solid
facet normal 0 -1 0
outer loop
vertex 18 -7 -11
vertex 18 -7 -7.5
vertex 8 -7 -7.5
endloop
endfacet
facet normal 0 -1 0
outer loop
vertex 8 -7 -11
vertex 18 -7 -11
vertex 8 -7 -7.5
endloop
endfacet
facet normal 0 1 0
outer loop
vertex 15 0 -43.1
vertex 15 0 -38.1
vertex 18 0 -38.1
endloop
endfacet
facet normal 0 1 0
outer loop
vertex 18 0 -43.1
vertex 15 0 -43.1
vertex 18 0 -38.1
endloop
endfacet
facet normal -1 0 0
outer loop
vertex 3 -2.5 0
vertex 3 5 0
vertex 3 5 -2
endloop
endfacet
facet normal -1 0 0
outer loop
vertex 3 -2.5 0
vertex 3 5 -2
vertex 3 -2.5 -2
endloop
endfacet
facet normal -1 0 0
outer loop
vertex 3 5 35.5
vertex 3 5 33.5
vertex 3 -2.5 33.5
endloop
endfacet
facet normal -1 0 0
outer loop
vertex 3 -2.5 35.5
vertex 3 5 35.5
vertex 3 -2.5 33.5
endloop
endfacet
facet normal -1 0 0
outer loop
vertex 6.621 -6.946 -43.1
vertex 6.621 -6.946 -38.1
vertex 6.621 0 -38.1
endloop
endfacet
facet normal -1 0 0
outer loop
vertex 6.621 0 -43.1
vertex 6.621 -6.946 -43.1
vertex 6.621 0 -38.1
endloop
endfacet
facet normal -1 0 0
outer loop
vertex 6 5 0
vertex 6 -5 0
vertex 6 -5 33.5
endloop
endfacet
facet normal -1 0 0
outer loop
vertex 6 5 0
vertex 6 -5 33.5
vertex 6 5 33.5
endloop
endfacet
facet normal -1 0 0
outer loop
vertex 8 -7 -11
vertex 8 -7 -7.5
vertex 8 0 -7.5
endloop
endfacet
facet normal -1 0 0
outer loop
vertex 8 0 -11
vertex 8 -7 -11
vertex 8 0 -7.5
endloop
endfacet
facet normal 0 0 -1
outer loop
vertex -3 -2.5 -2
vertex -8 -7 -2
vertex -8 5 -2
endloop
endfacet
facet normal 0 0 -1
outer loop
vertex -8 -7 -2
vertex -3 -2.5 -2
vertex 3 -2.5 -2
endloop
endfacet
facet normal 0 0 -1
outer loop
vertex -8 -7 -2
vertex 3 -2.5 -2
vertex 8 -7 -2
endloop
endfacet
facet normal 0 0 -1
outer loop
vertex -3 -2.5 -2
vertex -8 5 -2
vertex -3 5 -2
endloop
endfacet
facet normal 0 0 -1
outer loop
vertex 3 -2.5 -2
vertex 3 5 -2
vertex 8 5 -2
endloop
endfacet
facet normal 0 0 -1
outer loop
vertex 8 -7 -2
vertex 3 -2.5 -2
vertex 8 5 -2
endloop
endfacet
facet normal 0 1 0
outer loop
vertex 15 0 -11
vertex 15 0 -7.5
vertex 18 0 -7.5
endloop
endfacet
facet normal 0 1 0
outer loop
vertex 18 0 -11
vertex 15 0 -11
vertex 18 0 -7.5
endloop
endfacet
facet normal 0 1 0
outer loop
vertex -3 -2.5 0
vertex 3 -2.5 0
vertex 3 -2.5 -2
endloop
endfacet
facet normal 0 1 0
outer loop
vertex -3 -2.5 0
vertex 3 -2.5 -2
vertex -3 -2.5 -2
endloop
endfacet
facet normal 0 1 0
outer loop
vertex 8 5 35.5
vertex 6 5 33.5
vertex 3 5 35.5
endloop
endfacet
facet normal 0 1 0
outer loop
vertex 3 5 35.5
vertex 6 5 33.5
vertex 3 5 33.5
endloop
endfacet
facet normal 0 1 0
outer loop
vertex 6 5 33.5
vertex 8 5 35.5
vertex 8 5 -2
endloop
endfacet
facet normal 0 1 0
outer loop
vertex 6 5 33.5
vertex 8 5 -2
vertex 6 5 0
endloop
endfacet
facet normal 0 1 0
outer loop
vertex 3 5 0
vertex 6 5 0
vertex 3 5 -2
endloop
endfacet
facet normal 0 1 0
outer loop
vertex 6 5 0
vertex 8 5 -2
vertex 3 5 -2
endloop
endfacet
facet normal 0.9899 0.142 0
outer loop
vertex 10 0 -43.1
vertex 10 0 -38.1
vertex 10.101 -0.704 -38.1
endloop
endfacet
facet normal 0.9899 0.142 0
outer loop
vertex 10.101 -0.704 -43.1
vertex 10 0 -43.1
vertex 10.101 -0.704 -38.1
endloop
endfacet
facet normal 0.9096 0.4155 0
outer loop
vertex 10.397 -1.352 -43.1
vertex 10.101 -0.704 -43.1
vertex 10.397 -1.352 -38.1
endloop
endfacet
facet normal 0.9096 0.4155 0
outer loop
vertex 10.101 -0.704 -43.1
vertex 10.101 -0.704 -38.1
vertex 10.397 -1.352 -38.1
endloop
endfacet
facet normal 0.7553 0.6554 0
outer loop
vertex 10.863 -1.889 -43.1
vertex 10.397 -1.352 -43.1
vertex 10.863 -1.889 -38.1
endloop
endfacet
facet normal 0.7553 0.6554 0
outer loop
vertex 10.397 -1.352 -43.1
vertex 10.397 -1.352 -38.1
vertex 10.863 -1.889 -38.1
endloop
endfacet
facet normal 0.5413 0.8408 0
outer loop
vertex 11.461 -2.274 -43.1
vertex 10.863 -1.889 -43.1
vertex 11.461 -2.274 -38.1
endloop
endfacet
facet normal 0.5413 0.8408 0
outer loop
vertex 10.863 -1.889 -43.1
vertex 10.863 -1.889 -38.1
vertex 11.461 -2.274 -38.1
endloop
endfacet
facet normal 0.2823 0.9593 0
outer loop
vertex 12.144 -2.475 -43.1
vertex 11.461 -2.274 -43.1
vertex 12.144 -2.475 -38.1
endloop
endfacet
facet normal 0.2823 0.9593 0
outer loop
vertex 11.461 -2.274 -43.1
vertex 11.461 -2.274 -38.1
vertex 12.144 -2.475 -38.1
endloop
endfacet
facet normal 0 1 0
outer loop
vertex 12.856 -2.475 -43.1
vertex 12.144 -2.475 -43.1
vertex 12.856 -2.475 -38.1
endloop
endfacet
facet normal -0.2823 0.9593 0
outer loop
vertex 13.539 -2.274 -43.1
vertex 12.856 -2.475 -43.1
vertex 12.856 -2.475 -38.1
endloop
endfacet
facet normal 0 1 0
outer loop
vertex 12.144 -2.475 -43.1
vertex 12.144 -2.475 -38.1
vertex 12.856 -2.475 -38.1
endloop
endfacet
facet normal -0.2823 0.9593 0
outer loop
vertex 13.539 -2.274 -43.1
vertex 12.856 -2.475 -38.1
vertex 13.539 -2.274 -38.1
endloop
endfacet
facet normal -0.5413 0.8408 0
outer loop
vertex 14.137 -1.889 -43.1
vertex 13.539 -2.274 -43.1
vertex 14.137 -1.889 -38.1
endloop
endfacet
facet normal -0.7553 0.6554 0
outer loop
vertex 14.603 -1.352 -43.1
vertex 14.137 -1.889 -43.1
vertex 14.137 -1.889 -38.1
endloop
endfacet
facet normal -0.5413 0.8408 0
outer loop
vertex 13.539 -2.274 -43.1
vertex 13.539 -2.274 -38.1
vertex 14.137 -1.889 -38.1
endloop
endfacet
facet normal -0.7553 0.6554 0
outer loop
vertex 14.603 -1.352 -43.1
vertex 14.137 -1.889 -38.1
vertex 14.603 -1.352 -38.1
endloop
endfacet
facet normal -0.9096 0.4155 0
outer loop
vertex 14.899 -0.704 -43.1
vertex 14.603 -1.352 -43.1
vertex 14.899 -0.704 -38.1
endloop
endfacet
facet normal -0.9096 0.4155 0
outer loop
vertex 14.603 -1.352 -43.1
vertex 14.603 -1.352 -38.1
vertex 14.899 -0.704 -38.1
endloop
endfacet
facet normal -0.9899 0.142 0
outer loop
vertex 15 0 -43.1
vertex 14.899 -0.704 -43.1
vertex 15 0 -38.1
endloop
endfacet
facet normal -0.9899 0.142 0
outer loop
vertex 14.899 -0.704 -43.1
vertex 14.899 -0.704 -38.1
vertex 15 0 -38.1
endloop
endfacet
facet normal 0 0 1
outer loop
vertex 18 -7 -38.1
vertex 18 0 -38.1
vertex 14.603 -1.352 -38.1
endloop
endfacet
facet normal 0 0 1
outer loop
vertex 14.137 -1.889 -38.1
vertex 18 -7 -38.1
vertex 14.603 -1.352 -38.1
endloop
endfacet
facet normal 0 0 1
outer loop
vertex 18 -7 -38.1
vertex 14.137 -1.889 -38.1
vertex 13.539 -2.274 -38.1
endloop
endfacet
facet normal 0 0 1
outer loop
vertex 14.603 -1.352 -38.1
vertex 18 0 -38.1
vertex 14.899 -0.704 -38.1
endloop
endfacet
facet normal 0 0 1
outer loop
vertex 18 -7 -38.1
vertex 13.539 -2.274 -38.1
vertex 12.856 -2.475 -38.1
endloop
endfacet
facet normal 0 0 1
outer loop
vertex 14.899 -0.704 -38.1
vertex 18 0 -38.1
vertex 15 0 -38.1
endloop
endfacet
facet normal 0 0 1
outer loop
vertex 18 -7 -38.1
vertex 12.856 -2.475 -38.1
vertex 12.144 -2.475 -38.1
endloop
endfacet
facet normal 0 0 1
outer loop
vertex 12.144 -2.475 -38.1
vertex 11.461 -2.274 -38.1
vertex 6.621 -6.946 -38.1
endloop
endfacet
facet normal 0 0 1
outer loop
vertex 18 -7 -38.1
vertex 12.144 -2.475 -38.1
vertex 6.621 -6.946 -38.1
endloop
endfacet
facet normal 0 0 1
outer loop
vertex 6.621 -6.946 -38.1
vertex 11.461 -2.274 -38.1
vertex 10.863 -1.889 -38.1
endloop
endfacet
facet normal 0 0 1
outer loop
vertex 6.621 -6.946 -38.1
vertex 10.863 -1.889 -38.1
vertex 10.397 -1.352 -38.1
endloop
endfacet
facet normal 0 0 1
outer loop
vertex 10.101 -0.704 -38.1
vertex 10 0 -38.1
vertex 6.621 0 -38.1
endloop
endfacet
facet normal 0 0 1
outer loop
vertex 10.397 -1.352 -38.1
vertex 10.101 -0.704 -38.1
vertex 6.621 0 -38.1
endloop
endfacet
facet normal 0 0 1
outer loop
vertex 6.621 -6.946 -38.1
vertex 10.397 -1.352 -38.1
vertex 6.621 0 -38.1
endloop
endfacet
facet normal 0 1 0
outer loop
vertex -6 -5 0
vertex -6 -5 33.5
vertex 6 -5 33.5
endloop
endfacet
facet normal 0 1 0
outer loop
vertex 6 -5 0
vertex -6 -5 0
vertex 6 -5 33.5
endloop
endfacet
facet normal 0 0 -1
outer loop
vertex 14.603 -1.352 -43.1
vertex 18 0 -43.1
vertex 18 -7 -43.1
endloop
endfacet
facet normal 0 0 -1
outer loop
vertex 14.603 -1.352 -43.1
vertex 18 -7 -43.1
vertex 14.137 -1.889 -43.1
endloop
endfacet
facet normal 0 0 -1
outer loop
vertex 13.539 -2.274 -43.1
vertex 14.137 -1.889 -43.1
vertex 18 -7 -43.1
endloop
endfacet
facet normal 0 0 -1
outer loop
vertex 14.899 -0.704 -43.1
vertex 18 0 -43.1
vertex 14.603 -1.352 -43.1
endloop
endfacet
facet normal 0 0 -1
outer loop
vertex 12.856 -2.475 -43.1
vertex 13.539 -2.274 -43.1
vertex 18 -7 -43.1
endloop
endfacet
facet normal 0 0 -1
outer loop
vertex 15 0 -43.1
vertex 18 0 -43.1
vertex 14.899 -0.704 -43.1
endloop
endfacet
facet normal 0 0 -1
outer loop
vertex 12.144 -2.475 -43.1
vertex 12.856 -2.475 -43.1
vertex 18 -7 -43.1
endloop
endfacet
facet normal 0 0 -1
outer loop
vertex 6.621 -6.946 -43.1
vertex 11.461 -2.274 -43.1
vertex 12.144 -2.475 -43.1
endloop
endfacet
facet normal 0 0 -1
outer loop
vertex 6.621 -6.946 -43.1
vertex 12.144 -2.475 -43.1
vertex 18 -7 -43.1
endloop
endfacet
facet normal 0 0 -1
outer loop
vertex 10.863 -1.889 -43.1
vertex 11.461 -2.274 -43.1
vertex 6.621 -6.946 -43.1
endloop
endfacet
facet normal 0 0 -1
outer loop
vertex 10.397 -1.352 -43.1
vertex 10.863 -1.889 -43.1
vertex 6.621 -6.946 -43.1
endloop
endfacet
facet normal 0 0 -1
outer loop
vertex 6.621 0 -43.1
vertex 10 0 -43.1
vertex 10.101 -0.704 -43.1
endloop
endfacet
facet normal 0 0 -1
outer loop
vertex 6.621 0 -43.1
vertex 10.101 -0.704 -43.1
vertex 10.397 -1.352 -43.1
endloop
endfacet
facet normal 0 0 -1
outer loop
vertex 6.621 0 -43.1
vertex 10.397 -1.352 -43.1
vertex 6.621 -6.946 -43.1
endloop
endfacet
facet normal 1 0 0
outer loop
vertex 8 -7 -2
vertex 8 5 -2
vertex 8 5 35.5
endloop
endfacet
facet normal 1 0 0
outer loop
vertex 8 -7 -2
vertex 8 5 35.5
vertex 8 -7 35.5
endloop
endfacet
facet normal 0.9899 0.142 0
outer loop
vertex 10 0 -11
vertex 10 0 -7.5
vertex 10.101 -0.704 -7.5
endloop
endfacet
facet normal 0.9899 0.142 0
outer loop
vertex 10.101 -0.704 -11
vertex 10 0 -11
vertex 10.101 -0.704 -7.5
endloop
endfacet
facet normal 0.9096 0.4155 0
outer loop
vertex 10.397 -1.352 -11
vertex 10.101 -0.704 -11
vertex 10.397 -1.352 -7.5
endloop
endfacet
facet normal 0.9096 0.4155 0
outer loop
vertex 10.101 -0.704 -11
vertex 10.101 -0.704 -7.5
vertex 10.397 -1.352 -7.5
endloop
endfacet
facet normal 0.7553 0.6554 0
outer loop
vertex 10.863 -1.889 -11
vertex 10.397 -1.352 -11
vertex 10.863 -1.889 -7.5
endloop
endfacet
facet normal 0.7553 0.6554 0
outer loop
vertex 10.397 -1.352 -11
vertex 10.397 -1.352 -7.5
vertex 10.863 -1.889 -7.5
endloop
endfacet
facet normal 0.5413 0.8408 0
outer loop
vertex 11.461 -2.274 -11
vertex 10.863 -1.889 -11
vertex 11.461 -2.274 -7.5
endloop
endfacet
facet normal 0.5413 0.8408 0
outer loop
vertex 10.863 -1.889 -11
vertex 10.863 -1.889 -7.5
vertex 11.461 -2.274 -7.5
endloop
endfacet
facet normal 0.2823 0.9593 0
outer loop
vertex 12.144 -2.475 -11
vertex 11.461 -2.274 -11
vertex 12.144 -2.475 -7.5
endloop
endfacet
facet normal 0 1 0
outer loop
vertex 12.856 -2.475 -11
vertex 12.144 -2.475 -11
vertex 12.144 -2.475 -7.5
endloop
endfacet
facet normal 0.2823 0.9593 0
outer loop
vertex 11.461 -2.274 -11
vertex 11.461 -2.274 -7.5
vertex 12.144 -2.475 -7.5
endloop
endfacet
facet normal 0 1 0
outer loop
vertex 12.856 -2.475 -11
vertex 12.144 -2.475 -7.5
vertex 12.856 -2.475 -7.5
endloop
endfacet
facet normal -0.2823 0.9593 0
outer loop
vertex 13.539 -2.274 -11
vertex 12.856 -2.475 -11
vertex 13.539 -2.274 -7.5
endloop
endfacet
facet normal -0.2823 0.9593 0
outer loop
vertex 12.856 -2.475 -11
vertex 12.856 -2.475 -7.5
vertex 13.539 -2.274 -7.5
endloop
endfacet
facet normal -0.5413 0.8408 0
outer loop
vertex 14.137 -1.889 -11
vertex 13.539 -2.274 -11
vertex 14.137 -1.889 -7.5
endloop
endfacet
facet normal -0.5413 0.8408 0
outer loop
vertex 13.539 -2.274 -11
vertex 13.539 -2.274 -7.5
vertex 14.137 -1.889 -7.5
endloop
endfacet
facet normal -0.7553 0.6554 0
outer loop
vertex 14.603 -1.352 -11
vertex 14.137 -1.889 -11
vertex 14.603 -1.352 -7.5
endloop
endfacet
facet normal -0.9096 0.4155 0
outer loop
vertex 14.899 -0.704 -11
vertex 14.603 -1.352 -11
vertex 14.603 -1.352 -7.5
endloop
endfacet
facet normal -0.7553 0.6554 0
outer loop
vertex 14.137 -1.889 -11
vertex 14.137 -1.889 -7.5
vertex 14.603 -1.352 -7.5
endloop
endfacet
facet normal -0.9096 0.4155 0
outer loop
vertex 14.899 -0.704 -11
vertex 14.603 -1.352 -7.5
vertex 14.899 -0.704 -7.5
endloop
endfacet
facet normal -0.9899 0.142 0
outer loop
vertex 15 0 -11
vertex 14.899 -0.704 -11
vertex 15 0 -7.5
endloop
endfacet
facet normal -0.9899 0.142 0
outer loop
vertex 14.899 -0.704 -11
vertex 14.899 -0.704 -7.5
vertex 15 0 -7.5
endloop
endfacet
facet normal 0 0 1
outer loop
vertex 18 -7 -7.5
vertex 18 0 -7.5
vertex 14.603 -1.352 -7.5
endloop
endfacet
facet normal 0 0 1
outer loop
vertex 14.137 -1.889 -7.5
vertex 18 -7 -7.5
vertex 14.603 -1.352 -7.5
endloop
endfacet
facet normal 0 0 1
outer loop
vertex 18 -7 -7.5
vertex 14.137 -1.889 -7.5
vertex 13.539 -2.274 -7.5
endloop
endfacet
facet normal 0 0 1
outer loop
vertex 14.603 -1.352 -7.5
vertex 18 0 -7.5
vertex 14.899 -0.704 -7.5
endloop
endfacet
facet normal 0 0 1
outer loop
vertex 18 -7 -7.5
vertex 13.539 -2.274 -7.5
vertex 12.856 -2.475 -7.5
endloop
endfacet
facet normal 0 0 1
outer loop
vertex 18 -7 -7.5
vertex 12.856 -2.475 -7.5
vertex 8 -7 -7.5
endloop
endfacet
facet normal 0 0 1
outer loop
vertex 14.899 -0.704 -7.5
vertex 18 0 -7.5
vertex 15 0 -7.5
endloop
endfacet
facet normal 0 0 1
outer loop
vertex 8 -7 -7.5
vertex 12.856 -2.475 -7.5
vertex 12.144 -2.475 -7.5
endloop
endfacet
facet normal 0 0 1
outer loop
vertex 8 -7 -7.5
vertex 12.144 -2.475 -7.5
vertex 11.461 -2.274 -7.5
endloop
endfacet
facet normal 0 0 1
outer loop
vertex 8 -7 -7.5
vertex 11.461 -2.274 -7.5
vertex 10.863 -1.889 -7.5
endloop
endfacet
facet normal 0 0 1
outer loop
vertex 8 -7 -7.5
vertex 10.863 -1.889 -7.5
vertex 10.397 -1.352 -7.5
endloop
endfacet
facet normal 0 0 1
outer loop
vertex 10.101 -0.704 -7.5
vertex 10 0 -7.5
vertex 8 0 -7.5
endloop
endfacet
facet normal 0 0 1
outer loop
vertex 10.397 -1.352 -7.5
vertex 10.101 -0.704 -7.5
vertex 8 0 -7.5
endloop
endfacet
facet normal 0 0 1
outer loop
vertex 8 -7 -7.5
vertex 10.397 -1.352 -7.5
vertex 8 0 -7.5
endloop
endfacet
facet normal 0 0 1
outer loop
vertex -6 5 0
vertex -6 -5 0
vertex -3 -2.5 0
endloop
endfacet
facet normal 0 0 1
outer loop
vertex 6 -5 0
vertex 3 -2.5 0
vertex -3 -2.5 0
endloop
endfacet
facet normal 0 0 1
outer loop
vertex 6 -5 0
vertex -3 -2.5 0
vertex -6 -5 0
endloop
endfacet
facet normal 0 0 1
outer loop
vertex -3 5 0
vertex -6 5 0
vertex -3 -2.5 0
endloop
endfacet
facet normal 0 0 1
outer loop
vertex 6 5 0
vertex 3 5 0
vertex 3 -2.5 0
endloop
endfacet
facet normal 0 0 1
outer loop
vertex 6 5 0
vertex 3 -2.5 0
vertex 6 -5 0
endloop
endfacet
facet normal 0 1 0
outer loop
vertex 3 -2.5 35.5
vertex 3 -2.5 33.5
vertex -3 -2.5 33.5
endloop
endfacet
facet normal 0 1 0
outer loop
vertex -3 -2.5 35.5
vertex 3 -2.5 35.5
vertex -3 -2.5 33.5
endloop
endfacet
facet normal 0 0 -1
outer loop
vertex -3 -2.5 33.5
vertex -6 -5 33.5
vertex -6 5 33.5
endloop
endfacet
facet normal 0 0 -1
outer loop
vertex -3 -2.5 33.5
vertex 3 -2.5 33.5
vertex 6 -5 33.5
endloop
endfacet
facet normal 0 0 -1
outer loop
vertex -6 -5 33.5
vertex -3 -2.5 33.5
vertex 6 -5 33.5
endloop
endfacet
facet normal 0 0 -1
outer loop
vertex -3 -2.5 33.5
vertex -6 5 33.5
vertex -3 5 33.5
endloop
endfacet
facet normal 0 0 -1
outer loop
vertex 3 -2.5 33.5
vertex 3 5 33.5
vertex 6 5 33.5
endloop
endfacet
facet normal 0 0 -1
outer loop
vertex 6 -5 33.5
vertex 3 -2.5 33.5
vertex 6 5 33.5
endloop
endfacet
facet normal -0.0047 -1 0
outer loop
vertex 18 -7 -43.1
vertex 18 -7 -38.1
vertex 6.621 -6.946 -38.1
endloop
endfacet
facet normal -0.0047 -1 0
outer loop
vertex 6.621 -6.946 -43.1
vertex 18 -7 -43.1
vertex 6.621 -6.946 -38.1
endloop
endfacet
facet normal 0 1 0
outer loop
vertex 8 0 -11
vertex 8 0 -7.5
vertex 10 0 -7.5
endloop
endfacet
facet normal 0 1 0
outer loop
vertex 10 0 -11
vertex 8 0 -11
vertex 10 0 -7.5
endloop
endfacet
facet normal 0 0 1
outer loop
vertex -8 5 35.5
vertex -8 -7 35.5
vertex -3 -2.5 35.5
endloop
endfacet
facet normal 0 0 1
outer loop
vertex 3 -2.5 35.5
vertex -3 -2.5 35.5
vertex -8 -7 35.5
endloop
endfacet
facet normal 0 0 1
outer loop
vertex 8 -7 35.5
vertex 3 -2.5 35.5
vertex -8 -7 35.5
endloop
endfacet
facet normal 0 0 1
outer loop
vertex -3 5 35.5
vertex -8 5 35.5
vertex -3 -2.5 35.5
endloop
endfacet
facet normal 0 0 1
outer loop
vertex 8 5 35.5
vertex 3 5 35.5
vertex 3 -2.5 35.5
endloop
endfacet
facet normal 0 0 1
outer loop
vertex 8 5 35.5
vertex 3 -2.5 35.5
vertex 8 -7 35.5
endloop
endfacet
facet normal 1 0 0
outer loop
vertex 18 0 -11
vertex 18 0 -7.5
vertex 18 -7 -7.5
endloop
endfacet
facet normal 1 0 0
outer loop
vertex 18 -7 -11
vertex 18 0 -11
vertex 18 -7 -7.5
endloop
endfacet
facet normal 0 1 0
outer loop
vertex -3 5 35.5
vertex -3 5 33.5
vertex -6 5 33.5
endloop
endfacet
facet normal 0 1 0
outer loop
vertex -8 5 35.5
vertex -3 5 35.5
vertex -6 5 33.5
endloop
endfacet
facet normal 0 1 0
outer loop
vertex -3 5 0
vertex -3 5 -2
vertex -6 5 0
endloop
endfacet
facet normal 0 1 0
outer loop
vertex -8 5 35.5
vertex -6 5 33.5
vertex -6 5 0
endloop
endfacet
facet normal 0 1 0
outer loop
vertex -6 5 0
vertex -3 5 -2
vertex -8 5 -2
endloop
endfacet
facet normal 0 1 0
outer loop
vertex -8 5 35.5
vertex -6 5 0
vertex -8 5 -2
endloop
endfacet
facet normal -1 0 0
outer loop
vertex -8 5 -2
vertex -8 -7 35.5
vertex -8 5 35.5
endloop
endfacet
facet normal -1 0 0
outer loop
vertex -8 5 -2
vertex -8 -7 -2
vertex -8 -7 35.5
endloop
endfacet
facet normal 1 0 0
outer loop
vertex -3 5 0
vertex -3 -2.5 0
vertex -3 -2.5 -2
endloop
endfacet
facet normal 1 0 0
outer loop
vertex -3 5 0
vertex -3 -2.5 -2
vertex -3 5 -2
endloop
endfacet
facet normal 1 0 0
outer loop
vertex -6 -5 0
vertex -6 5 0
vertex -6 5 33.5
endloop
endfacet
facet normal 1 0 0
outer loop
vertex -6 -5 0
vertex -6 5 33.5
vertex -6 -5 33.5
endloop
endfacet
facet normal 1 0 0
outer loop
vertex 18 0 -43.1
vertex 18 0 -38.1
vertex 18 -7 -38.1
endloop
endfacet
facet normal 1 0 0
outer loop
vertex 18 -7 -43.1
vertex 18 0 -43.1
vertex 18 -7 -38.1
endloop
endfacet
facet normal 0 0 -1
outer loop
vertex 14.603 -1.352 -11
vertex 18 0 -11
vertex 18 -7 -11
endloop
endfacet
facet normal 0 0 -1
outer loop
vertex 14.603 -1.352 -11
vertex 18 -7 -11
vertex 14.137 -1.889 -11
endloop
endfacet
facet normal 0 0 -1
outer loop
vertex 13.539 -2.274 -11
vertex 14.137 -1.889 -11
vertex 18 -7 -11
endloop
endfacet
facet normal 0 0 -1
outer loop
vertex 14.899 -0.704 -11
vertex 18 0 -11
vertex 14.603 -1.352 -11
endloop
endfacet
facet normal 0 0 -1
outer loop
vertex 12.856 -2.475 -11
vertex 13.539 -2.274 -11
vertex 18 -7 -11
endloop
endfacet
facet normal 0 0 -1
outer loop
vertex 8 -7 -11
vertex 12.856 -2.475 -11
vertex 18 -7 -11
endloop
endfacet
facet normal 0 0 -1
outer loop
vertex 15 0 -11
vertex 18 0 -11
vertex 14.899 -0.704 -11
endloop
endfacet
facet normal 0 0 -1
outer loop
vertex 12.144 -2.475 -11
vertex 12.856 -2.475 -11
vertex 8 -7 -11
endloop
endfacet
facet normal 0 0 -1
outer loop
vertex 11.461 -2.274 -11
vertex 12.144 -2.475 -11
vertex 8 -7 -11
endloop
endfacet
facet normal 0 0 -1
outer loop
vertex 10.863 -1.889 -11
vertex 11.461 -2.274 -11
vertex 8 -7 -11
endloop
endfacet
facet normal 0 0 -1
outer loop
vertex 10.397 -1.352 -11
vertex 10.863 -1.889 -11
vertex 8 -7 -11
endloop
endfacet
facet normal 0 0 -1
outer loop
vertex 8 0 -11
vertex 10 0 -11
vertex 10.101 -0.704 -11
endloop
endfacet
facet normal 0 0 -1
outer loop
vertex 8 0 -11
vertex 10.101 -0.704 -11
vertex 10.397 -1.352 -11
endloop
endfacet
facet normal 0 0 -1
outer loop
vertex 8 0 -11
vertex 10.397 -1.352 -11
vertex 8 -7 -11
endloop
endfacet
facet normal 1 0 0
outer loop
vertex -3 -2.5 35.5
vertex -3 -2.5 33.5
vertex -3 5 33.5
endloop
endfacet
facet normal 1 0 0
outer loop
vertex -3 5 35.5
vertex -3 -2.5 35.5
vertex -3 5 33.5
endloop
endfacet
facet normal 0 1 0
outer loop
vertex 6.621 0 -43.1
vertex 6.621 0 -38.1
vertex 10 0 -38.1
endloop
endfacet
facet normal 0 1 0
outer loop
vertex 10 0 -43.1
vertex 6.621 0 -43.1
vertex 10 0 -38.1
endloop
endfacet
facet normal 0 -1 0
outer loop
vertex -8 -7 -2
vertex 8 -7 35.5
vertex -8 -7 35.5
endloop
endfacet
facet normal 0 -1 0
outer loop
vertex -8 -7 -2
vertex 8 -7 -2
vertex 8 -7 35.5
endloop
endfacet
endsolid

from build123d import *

# Parameters (mm, degrees)
BOSS_EXTRUDE1_DEPTH = 33.5
BOSS_EXTRUDE2_DEPTH = 2
BOSS_EXTRUDE3_START = 33.5
BOSS_EXTRUDE3_DEPTH = 2
BOSS_EXTRUDE4_START = 5.5
BOSS_EXTRUDE4_DEPTH = 3.5
BOSS_EXTRUDE5_DEPTH = 5


with BuildPart() as part:
    # Sketch1 → Boss-Extrude1 (new body)
    with BuildSketch(Plane.XY):
        Polygon((-6, 5), (-6, -5), (6, -5), (6, 5), (8, 5), (8, -7), (-8, -7), (-8, 5), align=None)
    extrude(amount=BOSS_EXTRUDE1_DEPTH)

    # Sketch1<3> → Boss-Extrude2 (add)
    with BuildSketch(Plane.XY):
        Polygon((-3, -2.5), (-3, 5), (-6, 5), (-6, -5), (6, -5), (6, 5), (3, 5), (3, -2.5), (0, -2.5), align=None)
        Polygon((-6, 5), (-6, -5), (6, -5), (6, 5), (8, 5), (8, -7), (-8, -7), (-8, 5), align=None)
    extrude(amount=-BOSS_EXTRUDE2_DEPTH)

    # Sketch1<4> → Boss-Extrude3 (add)
    with BuildSketch(Plane.XY.offset(BOSS_EXTRUDE3_START)):
        Polygon((-3, -2.5), (-3, 5), (-6, 5), (-6, -5), (6, -5), (6, 5), (3, 5), (3, -2.5), (0, -2.5), align=None)
        Polygon((-6, 5), (-6, -5), (6, -5), (6, 5), (8, 5), (8, -7), (-8, -7), (-8, 5), align=None)
    extrude(amount=BOSS_EXTRUDE3_DEPTH)


with BuildPart() as body_2:
    # Sketch3 → Boss-Extrude4 (new body)
    with BuildSketch(Plane(origin=(0, 0, -2), x_dir=(-1, 0, 0), z_dir=(0, 0, -1)).offset(BOSS_EXTRUDE4_START)):
        with BuildLine():
            ThreePointArc((-10, 0), (-12.5, -2.5), (-15, 0))
            Line((-15, 0), (-18, 0))
            Line((-18, 0), (-18, -7))
            Line((-18, -7), (-8, -7))
            Line((-8, -7), (-8, 0))
            Line((-8, 0), (-10, 0))
        make_face()
    extrude(amount=BOSS_EXTRUDE4_DEPTH)


with BuildPart() as body_3:
    # Sketch4 → Boss-Extrude5 (new body)
    with BuildSketch(Plane(origin=(0, 0, -38.1), x_dir=(-1, 0, 0), z_dir=(0, 0, -1))):
        with BuildLine():
            Line((-6.620772797, 0), (-10, 0))
            ThreePointArc((-10, 0), (-12.5, -2.5), (-15, 0))
            Line((-15, 0), (-18, 0))
            Line((-18, 0), (-18, -7))
            Line((-18, -7), (-6.620772797, -6.945839582))
            Line((-6.620772797, -6.945839582), (-6.620772797, 0))
        make_face()
    extrude(amount=BOSS_EXTRUDE5_DEPTH)


solid = Compound([part.part, body_2.part, body_3.part])
